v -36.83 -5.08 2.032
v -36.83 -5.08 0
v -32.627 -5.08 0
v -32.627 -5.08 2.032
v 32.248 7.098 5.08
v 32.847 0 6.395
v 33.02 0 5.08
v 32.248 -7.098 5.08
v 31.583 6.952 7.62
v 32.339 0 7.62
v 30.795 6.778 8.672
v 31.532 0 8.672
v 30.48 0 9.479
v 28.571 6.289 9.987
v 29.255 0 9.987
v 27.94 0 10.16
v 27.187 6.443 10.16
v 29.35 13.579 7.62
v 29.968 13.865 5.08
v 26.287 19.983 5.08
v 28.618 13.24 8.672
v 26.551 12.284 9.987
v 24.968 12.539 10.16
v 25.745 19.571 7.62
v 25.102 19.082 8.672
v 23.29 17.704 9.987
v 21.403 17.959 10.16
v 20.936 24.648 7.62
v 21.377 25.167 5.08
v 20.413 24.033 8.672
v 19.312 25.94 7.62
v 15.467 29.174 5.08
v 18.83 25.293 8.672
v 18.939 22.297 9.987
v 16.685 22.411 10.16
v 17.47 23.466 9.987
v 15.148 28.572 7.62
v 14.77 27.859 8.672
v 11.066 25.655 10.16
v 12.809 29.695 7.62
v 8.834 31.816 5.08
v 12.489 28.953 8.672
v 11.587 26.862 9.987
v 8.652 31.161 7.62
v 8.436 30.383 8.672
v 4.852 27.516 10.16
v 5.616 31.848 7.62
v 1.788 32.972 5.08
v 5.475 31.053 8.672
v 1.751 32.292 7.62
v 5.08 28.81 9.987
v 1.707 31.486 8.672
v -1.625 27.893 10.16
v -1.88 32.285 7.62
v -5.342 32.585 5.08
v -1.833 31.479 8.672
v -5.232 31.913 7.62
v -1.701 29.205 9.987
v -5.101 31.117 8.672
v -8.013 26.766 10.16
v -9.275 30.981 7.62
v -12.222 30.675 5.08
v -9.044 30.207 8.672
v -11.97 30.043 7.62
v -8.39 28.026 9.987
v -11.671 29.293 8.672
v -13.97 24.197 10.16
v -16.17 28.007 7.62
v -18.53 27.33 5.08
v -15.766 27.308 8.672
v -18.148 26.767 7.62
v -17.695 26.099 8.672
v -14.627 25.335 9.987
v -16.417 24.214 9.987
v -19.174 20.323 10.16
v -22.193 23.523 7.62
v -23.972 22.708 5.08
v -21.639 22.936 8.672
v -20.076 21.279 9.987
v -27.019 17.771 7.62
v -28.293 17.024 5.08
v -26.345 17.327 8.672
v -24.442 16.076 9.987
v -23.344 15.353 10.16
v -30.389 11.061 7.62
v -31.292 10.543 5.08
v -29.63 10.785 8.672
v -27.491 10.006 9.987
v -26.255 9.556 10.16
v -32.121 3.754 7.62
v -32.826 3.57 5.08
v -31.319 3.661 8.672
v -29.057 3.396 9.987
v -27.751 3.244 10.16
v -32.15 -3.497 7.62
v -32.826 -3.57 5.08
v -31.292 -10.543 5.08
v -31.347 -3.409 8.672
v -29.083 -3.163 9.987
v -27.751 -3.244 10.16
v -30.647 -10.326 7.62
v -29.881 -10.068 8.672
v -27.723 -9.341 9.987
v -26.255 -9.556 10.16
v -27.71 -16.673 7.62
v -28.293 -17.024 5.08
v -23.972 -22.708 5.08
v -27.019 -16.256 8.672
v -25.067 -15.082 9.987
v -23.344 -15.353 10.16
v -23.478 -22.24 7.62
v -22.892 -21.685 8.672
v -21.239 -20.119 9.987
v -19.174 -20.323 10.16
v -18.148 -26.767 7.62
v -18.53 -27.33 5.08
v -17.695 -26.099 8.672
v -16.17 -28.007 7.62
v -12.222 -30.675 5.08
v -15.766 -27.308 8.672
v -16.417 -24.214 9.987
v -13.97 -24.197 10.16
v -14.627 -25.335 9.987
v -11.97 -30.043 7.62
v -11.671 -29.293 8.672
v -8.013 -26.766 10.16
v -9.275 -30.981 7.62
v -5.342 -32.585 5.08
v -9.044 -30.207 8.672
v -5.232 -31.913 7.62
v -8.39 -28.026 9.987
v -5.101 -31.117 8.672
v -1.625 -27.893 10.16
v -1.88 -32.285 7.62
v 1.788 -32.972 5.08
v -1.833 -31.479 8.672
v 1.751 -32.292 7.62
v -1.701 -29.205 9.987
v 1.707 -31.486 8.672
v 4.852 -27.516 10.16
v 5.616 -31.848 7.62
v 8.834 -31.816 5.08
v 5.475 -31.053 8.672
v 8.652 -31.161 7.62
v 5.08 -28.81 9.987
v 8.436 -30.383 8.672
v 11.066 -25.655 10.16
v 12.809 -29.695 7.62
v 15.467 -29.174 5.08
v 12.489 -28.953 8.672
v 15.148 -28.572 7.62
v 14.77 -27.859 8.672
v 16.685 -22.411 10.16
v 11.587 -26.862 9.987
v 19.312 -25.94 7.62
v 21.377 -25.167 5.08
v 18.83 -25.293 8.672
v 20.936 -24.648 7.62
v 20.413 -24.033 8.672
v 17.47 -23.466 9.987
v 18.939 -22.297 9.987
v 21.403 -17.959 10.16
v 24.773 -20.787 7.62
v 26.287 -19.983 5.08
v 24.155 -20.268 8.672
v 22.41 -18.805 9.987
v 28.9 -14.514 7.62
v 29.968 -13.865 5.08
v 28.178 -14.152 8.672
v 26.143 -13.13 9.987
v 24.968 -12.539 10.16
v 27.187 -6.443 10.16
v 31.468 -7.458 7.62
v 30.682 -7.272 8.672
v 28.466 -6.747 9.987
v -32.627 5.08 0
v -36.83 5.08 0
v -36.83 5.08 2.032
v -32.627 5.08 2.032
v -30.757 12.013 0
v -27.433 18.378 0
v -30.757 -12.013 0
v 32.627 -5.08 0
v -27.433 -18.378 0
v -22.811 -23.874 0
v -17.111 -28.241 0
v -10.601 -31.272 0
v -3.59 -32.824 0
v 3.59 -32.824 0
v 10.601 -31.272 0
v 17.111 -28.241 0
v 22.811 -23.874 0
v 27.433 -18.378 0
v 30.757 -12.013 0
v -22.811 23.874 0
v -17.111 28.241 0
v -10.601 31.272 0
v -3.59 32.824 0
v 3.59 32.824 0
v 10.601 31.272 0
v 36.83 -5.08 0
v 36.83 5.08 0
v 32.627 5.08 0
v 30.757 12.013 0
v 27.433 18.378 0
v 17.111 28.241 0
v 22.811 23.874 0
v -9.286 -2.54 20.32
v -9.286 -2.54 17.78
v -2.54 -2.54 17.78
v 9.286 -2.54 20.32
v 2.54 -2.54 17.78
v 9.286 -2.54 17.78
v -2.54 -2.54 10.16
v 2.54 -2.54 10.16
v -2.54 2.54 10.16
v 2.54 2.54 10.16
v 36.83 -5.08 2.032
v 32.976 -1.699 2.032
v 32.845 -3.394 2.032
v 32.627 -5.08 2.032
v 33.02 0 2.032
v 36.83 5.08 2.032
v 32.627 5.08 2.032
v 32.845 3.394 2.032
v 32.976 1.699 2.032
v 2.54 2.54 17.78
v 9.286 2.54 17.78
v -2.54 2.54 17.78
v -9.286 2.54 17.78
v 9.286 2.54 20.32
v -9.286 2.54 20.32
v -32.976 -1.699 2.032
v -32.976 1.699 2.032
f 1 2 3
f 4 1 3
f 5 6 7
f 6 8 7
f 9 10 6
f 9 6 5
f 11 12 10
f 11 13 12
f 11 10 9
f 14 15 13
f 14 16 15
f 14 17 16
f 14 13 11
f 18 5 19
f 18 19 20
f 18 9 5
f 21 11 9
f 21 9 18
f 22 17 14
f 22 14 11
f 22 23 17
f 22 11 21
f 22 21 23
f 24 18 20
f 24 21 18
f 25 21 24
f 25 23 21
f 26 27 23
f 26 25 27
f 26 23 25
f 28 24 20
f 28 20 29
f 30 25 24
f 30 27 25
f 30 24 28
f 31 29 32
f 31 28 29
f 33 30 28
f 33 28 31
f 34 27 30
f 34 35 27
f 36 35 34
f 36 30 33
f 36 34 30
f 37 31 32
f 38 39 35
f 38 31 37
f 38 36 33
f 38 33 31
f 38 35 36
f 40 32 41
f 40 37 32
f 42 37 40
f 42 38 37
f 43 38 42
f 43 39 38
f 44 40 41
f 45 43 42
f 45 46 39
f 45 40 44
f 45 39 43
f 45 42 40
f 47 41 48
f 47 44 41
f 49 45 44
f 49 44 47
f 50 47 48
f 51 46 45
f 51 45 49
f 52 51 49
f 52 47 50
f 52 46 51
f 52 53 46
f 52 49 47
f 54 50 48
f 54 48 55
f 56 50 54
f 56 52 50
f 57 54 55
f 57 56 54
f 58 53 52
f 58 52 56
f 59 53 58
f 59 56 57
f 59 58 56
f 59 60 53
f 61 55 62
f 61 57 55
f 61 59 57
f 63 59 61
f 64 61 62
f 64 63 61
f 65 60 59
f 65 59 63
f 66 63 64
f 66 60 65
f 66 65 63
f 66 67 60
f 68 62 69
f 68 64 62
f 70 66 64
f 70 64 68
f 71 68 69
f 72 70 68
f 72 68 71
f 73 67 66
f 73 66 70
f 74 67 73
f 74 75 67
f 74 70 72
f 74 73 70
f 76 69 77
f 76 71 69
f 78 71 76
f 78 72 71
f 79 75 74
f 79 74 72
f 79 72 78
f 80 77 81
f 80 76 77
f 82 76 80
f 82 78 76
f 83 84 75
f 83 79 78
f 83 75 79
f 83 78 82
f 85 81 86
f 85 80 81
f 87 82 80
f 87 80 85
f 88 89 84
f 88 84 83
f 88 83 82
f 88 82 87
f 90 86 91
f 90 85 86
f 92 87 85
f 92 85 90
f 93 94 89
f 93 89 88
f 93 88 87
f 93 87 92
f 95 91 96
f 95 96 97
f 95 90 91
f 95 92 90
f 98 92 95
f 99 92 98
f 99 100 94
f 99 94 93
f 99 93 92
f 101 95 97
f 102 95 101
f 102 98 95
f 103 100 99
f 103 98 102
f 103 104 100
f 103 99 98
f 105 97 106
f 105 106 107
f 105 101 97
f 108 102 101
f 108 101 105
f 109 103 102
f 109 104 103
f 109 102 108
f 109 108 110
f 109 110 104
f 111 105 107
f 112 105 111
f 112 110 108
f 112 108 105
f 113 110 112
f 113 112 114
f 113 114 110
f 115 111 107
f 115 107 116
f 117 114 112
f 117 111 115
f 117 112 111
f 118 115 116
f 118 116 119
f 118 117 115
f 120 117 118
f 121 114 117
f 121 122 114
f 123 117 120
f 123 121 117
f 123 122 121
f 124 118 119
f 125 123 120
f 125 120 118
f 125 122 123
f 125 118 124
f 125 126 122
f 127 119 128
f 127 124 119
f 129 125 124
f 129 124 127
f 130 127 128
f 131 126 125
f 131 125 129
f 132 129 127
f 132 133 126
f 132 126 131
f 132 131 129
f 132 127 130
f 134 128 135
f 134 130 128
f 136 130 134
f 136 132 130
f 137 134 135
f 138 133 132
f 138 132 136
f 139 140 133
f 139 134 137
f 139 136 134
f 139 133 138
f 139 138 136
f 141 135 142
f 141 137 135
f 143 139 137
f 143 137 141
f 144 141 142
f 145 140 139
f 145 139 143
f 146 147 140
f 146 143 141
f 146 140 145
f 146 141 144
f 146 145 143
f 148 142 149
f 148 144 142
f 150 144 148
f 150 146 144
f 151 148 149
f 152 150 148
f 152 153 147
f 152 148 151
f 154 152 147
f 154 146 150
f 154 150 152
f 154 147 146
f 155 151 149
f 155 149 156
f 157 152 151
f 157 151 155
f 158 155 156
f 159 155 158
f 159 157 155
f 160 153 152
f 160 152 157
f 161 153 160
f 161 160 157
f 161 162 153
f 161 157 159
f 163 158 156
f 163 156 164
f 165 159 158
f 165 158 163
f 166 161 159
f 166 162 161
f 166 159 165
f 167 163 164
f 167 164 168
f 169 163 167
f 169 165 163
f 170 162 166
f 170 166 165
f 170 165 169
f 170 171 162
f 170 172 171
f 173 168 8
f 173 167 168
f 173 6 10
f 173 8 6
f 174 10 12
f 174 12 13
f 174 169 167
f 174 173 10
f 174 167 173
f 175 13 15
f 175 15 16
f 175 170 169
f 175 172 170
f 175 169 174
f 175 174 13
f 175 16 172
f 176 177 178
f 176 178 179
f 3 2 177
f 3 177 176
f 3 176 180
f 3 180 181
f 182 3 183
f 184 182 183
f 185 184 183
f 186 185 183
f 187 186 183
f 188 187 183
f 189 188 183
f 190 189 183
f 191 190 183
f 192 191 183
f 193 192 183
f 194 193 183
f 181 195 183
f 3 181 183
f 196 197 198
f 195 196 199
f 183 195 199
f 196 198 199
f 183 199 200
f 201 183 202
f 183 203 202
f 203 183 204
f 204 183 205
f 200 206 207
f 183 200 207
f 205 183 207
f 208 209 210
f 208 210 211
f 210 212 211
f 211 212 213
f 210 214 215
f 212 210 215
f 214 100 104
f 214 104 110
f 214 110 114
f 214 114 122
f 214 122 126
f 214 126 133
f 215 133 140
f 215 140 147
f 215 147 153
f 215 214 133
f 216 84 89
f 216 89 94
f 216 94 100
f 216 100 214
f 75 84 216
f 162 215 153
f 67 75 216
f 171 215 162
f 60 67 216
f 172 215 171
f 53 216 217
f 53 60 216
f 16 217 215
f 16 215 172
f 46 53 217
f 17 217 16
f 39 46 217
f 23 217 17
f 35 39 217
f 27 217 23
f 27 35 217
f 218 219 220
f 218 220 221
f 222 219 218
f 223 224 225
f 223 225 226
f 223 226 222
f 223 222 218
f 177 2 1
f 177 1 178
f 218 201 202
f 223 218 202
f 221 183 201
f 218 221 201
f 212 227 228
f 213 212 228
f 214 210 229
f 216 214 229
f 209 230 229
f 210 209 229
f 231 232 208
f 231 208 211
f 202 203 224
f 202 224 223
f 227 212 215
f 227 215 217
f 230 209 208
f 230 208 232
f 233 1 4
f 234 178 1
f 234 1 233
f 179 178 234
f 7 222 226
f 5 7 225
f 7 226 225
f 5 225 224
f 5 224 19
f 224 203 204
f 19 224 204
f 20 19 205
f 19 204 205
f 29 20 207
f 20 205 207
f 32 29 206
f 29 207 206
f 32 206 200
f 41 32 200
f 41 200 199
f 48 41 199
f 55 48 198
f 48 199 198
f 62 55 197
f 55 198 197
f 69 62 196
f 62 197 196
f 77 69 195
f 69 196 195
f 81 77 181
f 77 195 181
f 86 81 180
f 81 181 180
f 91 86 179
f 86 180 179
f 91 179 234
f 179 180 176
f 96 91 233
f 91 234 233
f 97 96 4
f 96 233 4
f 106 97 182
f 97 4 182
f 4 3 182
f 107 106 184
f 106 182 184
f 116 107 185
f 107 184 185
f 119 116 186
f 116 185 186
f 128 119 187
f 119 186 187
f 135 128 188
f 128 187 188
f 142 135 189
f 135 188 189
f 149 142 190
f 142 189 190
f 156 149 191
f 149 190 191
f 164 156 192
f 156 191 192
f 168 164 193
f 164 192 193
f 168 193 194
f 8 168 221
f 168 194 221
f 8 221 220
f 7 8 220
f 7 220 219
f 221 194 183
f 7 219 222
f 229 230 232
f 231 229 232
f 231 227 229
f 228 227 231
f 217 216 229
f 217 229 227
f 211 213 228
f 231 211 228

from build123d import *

# Parameters (mm, degrees)
F0_R     = 33.02
F1_DEPTH = 10.16
F2_R     = 5.08
F3_W     = 5.08
F3_H     = 5.08
F4_DEPTH = 7.62
F5_W     = 18.572674
F5_H     = 5.08
F6_DEPTH = 2.54
F7_W     = 73.66
F7_H     = 10.16
F8_DEPTH = 2.032


with BuildPart() as f1:
    # F0 (on Top) → F1 (new body)
    with BuildSketch(Plane.XY):
        Circle(F0_R)
    extrude(amount=F1_DEPTH)

    # F2
    f2_edges = [f1.edges().sort_by_distance(p)[0] for p in [
        (-33.02, 0, 10.16),
    ]]
    fillet(f2_edges, radius=F2_R)

    # F3 (on face) → F4 (join)
    with BuildSketch(Plane.XY.offset(10.16)):
        Rectangle(F3_W, F3_H)
    extrude(amount=F4_DEPTH)

    # F5 (on face) → F6 (join)
    with BuildSketch(Plane.XY.offset(17.78)):
        Rectangle(F5_W, F5_H)
    extrude(amount=F6_DEPTH)

    # F7 (on Top) → F8 (join)
    with BuildSketch(Plane.XY):
        Rectangle(F7_W, F7_H)
    extrude(amount=F8_DEPTH)


solid = f1.part
